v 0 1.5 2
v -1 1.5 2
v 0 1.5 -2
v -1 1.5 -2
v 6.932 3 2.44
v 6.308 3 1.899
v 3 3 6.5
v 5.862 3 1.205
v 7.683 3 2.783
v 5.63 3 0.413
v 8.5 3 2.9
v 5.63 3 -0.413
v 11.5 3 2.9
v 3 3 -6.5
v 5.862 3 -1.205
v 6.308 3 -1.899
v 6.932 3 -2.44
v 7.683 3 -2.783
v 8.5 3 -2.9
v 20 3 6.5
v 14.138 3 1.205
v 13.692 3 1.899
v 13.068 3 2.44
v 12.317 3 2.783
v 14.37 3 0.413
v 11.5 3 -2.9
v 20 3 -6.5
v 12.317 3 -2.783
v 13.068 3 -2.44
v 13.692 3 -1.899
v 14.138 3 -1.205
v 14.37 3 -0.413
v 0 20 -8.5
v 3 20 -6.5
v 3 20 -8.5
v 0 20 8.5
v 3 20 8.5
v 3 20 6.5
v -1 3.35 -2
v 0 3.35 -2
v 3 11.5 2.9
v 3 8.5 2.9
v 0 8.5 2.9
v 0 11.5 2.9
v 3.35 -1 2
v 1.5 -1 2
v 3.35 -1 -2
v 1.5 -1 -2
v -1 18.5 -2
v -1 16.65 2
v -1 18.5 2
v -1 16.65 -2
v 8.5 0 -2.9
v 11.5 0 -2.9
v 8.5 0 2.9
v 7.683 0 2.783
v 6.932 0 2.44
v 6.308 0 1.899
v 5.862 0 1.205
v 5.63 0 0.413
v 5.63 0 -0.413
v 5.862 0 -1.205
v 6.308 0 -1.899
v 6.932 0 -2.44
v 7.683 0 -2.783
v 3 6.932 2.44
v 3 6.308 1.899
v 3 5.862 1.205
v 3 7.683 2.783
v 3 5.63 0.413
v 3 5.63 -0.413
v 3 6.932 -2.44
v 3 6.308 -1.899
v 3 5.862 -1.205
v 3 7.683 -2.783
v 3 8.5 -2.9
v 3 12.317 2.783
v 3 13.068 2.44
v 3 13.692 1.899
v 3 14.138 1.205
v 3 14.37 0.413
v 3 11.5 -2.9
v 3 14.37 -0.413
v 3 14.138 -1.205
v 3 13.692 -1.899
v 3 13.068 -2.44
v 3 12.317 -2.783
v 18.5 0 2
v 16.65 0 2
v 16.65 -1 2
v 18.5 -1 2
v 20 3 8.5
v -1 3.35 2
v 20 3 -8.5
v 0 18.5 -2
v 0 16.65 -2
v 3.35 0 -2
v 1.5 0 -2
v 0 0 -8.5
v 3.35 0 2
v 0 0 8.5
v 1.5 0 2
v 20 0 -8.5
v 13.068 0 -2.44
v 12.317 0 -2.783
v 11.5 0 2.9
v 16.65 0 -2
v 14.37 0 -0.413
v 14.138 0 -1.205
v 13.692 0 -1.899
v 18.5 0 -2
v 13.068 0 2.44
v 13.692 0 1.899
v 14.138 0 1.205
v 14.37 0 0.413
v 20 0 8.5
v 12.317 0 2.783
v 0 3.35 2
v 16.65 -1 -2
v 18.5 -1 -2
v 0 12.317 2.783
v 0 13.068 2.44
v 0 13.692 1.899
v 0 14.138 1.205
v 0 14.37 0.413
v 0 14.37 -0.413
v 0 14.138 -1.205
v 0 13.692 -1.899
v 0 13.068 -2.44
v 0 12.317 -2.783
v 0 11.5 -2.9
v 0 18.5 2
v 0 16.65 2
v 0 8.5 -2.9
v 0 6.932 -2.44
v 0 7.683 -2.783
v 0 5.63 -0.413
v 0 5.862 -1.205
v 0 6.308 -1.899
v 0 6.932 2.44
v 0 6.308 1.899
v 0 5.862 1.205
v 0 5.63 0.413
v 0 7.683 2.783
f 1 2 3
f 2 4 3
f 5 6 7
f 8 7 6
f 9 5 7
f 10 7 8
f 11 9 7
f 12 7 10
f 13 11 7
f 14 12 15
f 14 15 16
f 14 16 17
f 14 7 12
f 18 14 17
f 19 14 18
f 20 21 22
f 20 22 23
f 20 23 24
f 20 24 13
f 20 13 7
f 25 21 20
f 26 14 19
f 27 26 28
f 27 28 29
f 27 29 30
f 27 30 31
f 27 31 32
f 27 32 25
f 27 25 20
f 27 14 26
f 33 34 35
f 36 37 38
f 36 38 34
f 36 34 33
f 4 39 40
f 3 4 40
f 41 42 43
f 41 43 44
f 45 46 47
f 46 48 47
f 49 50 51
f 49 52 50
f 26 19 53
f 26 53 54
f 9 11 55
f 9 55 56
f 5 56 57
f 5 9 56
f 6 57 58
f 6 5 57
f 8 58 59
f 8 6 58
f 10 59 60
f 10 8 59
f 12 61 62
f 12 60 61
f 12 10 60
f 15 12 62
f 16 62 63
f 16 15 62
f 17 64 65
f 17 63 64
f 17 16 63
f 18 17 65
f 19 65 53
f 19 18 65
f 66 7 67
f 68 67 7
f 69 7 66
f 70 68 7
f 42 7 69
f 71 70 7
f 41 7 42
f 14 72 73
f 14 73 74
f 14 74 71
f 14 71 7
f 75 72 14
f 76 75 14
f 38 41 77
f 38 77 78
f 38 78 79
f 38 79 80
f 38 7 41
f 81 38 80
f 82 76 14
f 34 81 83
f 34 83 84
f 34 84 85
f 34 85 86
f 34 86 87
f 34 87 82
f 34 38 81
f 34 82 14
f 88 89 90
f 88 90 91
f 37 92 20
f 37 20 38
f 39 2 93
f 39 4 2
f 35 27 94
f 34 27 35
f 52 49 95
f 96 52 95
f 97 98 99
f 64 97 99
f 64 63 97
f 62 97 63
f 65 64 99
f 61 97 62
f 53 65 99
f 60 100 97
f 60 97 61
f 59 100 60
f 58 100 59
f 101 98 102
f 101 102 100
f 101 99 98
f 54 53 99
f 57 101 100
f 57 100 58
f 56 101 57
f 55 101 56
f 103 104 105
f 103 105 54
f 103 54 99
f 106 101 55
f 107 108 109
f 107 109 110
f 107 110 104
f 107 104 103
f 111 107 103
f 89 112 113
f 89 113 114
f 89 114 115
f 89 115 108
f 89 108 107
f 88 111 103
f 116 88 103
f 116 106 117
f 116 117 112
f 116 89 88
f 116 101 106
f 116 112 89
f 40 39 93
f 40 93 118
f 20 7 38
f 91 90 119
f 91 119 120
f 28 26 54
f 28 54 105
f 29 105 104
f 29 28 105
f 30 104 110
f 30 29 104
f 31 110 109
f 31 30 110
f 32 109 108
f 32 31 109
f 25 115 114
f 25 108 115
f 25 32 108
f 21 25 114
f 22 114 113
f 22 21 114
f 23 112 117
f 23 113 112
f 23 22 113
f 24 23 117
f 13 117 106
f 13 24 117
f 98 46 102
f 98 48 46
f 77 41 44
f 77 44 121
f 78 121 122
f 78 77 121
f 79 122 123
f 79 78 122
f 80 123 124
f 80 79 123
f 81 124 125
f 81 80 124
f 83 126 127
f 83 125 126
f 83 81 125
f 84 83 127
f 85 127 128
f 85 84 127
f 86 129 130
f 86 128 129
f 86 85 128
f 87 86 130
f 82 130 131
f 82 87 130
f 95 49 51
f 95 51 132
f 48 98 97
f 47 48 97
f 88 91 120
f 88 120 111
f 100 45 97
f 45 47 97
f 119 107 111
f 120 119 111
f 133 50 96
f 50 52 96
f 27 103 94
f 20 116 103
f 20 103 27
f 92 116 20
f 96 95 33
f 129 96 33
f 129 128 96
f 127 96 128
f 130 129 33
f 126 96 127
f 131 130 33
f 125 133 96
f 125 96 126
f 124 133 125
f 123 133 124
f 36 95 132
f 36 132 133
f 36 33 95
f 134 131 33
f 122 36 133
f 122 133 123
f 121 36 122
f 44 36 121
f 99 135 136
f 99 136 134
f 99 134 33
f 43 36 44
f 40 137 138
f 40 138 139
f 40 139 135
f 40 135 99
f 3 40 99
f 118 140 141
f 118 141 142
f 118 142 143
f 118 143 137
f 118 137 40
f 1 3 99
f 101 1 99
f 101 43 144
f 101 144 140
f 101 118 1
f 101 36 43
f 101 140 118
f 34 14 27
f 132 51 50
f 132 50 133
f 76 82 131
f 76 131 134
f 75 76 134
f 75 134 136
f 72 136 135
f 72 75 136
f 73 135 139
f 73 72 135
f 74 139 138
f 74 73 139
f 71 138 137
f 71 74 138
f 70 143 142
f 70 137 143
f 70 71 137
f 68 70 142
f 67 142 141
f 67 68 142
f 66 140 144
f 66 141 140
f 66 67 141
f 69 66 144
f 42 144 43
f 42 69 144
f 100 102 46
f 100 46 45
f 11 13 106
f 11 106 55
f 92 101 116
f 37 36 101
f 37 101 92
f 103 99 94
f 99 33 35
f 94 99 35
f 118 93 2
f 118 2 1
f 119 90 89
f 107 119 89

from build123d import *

# Parameters (mm, degrees)
BOSS_EXTRUDE1_DEPTH = 8.5
SKETCH2_W           = 17
SKETCH2_H           = 13
CUT_EXTRUDE1_DEPTH  = 17
CUT_EXTRUDE2_REACH  = 5
CUT_EXTRUDE3_DEPTH  = 4
SKETCH6_W           = 1
SKETCH6_H           = 1.85
SKETCH6_W_2         = 1.85
SKETCH6_H_2         = 1
BOSS_EXTRUDE2_DEPTH = 2


with BuildPart() as part:
    # Sketch1 → Boss-Extrude1 (new body, symmetric)
    with BuildSketch(Plane.XY):
        Polygon((0, 20), (0, 0), (20, 0), (20, 3), (3, 20), align=None)
    extrude(amount=BOSS_EXTRUDE1_DEPTH, both=True)

    # Sketch2 → Cut-Extrude1 (cut)
    with BuildSketch(Plane(origin=(0, 20, 0), x_dir=(1, 0, 0), z_dir=(0, 1, 0))):
        with Locations((11.5, 0)):
            Rectangle(SKETCH2_W, SKETCH2_H)
    extrude(amount=-CUT_EXTRUDE1_DEPTH, mode=Mode.SUBTRACT)

    # Sketch3 → Cut-Extrude2 (cut, up to next)
    with BuildSketch(Plane(origin=(3, 0, 0), x_dir=(0, 0, -1), z_dir=(1, 0, 0)), mode=Mode.PRIVATE) as cut_extrude2_sk1:
        with BuildLine():
            Line((-2.9, 8.5), (-2.9, 11.5))
            ThreePointArc((-2.9, 11.5), (0, 14.4), (2.9, 11.5))
            Line((2.9, 11.5), (2.9, 8.5))
            ThreePointArc((2.9, 8.5), (0, 5.6), (-2.9, 8.5))
        make_face()
    cut_extrude2_tool1 = extrude(cut_extrude2_sk1.sketch, amount=-CUT_EXTRUDE2_REACH, mode=Mode.PRIVATE) & part.part
    add(cut_extrude2_tool1.solids().sort_by_distance((3, 10, 0))[0], mode=Mode.SUBTRACT)

    # Sketch5 → Cut-Extrude3 (cut, through all)
    with BuildSketch(Plane(origin=(0, 3, 0), x_dir=(1, 0, 0), z_dir=(0, 1, 0))):
        with BuildLine():
            Line((11.5, -2.9), (8.5, -2.9))
            ThreePointArc((8.5, -2.9), (5.6, 0), (8.5, 2.9))
            Line((8.5, 2.9), (11.5, 2.9))
            ThreePointArc((11.5, 2.9), (14.4, 0), (11.5, -2.9))
        make_face()
    extrude(amount=-CUT_EXTRUDE3_DEPTH, mode=Mode.SUBTRACT)

    # Sketch6 → Boss-Extrude2 (add, symmetric)
    with BuildSketch(Plane.XY):
        with Locations((-0.5, 17.575)):
            Rectangle(SKETCH6_W, SKETCH6_H)
        with Locations((-0.5, 2.425)):
            Rectangle(SKETCH6_W, SKETCH6_H)
        with Locations((2.425, -0.5)):
            Rectangle(SKETCH6_W_2, SKETCH6_H_2)
        with Locations((17.575, -0.5)):
            Rectangle(SKETCH6_W_2, SKETCH6_H_2)
    extrude(amount=BOSS_EXTRUDE2_DEPTH, both=True)


solid = part.part
